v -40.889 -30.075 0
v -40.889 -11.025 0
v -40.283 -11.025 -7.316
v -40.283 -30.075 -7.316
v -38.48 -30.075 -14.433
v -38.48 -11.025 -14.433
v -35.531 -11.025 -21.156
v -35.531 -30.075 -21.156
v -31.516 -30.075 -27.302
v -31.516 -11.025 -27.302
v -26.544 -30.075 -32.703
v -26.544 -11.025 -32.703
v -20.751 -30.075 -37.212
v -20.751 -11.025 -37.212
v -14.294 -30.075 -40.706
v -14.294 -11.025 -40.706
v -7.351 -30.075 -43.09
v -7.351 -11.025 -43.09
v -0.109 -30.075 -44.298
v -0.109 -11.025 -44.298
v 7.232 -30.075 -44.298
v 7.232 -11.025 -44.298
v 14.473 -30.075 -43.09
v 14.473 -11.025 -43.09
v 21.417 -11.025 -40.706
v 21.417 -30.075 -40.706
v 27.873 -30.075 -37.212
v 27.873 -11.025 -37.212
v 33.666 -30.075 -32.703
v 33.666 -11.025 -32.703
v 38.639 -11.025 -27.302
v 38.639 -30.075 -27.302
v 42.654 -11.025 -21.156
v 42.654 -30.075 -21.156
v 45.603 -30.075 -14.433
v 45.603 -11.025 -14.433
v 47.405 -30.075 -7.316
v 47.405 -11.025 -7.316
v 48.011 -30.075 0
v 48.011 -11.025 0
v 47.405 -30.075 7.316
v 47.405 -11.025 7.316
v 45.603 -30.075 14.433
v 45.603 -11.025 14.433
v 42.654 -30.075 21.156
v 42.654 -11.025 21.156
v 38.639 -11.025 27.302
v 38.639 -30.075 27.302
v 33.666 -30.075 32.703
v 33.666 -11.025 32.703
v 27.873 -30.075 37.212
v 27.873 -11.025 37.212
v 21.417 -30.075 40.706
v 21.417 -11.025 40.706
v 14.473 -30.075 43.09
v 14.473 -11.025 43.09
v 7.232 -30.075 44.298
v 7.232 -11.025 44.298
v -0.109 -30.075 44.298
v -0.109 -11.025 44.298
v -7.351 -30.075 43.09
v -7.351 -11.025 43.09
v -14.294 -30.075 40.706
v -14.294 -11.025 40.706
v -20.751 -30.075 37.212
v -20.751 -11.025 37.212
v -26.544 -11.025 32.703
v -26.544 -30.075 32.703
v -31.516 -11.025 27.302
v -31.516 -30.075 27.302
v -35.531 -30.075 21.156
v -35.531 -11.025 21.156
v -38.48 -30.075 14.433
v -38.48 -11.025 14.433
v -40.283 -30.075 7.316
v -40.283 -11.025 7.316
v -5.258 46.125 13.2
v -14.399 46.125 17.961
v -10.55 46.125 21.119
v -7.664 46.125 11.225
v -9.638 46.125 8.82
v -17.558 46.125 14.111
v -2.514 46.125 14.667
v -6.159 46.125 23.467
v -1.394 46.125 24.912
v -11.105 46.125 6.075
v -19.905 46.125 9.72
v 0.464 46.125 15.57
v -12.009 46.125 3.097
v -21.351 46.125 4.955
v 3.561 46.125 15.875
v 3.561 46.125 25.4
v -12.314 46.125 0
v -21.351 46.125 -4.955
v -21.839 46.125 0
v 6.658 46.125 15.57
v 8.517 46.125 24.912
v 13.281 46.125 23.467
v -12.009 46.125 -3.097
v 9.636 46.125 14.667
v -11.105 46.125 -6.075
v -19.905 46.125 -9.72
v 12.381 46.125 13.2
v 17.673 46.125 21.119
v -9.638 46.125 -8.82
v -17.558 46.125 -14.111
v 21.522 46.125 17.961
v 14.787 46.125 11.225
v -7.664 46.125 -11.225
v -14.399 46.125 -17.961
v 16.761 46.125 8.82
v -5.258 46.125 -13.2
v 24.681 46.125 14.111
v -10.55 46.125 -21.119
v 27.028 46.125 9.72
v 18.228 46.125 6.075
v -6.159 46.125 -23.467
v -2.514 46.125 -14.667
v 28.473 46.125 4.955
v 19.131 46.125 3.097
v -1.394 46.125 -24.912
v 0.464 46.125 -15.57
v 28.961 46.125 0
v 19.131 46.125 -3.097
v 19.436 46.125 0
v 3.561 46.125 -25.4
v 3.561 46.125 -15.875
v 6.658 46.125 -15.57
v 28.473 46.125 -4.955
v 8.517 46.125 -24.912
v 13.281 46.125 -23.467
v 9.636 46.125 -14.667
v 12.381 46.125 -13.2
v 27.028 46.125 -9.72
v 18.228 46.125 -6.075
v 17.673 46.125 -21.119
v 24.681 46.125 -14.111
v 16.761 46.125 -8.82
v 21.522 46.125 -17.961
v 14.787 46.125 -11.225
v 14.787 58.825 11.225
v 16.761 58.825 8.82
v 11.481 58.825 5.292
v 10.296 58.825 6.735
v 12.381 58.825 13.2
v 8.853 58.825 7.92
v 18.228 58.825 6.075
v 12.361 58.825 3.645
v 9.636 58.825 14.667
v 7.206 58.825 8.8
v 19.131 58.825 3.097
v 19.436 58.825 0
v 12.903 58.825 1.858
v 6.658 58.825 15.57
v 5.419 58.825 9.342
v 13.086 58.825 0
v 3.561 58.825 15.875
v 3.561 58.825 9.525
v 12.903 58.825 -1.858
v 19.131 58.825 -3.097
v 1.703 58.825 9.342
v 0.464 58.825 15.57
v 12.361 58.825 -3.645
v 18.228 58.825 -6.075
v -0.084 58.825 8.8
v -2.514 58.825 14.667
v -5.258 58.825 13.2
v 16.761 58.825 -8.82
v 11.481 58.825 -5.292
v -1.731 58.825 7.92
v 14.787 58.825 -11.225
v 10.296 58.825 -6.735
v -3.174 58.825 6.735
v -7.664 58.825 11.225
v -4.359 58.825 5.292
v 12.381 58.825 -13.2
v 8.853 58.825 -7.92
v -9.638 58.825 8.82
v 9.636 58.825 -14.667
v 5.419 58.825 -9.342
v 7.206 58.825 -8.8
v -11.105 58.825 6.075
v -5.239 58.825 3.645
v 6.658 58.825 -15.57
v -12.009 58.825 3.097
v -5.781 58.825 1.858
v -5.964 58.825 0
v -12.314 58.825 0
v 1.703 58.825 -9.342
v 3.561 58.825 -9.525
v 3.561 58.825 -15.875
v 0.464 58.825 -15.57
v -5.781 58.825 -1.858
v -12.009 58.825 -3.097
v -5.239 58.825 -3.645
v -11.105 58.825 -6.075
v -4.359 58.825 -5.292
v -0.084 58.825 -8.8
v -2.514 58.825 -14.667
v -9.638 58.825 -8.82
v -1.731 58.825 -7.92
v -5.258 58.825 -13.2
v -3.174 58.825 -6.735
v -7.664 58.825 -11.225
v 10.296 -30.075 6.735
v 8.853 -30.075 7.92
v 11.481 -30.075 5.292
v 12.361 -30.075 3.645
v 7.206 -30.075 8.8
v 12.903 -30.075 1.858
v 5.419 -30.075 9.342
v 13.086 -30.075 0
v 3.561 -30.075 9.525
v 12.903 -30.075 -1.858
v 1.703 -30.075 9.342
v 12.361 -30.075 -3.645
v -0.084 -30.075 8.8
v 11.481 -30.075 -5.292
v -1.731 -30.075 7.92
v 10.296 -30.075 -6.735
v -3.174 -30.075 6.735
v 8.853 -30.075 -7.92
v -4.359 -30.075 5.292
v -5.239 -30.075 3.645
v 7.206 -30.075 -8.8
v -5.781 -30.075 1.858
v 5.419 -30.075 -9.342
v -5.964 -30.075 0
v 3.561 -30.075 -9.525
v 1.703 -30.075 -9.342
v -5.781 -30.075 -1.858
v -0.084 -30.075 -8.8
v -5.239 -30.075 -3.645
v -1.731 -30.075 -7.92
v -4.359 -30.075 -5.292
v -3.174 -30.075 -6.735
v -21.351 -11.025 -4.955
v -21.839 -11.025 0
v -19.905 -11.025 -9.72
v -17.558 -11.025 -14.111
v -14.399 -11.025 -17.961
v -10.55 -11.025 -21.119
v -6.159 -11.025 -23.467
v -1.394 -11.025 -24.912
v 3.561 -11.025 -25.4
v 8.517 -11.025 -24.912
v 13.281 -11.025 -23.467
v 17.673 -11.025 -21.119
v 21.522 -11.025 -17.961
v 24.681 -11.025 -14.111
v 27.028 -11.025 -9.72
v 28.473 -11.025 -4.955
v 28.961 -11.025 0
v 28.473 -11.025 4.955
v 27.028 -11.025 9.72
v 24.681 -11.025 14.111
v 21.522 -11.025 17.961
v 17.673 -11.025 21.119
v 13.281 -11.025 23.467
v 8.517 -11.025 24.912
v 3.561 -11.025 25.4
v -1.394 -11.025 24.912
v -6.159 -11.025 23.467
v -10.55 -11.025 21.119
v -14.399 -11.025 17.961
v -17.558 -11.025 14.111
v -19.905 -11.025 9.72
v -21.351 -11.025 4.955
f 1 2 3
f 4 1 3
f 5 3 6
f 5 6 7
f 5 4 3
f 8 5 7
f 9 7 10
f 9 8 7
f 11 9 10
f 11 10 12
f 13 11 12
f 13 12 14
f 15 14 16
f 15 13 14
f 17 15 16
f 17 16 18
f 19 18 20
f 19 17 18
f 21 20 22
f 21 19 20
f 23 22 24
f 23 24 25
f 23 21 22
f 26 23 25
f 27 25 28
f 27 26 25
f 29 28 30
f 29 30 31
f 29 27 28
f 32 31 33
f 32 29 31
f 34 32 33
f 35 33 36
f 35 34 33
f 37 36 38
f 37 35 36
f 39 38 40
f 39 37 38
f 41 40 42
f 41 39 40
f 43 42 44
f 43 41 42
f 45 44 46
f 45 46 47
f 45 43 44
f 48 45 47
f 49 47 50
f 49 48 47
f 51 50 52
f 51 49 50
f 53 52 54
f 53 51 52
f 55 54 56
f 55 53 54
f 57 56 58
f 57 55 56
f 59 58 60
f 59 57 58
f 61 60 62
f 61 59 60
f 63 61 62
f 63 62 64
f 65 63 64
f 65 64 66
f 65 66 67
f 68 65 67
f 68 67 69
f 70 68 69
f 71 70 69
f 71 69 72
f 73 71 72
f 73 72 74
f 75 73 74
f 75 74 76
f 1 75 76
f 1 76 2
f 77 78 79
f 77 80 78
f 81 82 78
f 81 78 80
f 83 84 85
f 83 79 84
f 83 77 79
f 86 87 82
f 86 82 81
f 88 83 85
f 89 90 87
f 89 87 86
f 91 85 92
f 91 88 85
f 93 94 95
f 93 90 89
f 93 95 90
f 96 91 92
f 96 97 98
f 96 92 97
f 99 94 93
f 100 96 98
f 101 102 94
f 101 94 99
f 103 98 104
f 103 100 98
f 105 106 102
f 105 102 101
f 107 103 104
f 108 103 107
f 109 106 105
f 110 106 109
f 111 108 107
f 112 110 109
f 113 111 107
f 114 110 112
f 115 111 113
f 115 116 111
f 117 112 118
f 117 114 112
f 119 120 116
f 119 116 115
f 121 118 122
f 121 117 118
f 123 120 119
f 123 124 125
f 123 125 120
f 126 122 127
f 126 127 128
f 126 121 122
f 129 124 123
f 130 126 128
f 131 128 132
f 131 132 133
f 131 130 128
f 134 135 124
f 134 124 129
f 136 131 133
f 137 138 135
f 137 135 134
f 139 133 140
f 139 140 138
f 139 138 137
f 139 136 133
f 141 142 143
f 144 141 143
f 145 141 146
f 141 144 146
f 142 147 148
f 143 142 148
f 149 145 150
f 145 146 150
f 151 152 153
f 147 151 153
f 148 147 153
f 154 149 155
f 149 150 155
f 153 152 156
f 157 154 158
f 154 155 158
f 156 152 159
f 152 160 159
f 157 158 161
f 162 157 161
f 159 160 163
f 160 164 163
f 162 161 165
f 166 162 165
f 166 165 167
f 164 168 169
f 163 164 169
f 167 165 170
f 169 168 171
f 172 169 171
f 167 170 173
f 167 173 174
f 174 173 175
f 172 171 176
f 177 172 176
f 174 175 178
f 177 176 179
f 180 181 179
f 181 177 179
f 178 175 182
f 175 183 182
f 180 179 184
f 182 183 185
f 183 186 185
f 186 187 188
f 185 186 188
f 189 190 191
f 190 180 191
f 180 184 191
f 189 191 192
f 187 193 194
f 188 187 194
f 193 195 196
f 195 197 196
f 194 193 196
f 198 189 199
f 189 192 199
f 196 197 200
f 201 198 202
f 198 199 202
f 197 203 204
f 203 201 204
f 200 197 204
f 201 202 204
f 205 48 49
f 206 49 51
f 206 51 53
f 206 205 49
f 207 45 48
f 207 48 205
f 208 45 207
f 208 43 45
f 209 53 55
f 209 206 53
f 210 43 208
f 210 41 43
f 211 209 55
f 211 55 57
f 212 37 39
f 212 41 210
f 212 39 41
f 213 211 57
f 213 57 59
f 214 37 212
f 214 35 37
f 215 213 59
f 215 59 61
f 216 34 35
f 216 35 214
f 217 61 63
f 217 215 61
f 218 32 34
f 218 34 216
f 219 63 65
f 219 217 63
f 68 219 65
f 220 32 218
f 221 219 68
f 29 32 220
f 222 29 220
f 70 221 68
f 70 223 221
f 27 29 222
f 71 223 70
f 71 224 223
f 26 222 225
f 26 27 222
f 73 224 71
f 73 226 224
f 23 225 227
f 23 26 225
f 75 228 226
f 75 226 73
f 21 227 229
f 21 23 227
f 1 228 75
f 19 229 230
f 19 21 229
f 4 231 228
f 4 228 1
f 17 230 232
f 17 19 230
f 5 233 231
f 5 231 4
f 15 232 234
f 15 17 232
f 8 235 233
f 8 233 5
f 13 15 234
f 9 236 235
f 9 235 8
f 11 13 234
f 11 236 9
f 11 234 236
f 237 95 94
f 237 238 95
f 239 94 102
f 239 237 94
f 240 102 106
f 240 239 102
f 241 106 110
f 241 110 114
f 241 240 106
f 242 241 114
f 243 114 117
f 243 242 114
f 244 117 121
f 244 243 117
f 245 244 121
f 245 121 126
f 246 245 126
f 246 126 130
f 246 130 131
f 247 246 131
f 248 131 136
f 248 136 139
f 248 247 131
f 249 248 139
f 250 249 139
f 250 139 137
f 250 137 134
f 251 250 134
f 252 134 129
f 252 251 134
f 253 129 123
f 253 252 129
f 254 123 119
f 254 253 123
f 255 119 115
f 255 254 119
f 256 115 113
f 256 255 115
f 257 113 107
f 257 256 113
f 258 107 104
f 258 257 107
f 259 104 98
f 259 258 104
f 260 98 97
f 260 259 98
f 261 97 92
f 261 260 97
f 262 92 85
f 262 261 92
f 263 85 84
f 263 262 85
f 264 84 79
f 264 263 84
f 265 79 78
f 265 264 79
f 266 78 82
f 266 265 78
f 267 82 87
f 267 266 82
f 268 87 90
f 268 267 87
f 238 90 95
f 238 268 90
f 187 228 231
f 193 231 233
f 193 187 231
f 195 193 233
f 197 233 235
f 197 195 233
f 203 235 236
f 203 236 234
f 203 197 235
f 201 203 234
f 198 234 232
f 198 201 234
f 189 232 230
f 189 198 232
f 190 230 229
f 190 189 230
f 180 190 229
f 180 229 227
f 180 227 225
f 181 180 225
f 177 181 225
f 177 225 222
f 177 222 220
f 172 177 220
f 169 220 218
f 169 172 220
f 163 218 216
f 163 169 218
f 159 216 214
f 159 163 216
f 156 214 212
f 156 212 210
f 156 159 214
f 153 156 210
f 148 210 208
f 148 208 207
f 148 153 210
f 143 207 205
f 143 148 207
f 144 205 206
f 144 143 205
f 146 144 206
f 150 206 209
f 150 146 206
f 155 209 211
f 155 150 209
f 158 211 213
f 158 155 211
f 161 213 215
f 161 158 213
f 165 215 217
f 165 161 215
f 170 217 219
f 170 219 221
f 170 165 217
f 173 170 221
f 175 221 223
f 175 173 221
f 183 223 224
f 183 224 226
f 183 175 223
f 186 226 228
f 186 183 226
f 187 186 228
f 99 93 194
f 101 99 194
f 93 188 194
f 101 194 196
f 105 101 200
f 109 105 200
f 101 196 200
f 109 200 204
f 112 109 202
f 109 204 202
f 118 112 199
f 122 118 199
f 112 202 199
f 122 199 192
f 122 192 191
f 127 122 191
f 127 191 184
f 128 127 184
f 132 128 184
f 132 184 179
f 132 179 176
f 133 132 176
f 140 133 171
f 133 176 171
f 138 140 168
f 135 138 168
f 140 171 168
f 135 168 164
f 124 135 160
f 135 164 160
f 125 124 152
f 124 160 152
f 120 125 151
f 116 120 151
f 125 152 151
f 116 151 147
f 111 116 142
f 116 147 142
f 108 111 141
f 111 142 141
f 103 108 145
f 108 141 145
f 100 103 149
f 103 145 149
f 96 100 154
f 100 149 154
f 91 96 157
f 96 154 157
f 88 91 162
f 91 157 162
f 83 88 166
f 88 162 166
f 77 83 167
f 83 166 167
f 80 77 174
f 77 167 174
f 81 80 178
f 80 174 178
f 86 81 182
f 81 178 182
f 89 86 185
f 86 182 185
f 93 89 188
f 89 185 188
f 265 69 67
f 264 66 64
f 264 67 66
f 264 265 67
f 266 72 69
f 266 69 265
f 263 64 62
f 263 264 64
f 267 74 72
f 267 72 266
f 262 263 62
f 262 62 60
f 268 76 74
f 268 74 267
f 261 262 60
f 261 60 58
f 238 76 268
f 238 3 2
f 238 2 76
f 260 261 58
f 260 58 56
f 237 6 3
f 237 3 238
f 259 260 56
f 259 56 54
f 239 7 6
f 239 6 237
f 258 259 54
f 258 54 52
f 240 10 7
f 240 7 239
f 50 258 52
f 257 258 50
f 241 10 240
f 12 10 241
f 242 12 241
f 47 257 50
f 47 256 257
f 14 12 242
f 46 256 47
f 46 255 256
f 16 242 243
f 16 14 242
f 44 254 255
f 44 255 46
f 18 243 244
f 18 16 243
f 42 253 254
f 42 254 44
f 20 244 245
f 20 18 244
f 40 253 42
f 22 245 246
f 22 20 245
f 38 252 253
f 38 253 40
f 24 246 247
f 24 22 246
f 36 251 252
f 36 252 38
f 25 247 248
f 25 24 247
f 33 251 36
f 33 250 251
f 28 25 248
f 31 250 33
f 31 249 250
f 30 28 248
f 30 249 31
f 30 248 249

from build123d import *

# Parameters (mm, degrees)
F0_W = 6.35
F0_H = 12.7


with BuildPart() as f1:
    # F0 (on Top) → F1 (revolve)
    with BuildSketch(Plane.XY):
        Polygon((-5.963771, -11.02523), (-5.963771, 46.12477), (-12.313771, 46.12477), (-21.838771, 46.12477), (-21.838771, -11.02523), align=None)
        Polygon((-5.963771, -30.07523), (-5.963771, -11.02523), (-21.838771, -11.02523), (-40.888771, -11.02523), (-40.888771, -30.07523), align=None)
        with Locations((-9.138771, 52.47477)):
            Rectangle(F0_W, F0_H)
    revolve(axis=Axis((3.561229, 14.37477, 0), (0, -1, 0)))


solid = f1.part
